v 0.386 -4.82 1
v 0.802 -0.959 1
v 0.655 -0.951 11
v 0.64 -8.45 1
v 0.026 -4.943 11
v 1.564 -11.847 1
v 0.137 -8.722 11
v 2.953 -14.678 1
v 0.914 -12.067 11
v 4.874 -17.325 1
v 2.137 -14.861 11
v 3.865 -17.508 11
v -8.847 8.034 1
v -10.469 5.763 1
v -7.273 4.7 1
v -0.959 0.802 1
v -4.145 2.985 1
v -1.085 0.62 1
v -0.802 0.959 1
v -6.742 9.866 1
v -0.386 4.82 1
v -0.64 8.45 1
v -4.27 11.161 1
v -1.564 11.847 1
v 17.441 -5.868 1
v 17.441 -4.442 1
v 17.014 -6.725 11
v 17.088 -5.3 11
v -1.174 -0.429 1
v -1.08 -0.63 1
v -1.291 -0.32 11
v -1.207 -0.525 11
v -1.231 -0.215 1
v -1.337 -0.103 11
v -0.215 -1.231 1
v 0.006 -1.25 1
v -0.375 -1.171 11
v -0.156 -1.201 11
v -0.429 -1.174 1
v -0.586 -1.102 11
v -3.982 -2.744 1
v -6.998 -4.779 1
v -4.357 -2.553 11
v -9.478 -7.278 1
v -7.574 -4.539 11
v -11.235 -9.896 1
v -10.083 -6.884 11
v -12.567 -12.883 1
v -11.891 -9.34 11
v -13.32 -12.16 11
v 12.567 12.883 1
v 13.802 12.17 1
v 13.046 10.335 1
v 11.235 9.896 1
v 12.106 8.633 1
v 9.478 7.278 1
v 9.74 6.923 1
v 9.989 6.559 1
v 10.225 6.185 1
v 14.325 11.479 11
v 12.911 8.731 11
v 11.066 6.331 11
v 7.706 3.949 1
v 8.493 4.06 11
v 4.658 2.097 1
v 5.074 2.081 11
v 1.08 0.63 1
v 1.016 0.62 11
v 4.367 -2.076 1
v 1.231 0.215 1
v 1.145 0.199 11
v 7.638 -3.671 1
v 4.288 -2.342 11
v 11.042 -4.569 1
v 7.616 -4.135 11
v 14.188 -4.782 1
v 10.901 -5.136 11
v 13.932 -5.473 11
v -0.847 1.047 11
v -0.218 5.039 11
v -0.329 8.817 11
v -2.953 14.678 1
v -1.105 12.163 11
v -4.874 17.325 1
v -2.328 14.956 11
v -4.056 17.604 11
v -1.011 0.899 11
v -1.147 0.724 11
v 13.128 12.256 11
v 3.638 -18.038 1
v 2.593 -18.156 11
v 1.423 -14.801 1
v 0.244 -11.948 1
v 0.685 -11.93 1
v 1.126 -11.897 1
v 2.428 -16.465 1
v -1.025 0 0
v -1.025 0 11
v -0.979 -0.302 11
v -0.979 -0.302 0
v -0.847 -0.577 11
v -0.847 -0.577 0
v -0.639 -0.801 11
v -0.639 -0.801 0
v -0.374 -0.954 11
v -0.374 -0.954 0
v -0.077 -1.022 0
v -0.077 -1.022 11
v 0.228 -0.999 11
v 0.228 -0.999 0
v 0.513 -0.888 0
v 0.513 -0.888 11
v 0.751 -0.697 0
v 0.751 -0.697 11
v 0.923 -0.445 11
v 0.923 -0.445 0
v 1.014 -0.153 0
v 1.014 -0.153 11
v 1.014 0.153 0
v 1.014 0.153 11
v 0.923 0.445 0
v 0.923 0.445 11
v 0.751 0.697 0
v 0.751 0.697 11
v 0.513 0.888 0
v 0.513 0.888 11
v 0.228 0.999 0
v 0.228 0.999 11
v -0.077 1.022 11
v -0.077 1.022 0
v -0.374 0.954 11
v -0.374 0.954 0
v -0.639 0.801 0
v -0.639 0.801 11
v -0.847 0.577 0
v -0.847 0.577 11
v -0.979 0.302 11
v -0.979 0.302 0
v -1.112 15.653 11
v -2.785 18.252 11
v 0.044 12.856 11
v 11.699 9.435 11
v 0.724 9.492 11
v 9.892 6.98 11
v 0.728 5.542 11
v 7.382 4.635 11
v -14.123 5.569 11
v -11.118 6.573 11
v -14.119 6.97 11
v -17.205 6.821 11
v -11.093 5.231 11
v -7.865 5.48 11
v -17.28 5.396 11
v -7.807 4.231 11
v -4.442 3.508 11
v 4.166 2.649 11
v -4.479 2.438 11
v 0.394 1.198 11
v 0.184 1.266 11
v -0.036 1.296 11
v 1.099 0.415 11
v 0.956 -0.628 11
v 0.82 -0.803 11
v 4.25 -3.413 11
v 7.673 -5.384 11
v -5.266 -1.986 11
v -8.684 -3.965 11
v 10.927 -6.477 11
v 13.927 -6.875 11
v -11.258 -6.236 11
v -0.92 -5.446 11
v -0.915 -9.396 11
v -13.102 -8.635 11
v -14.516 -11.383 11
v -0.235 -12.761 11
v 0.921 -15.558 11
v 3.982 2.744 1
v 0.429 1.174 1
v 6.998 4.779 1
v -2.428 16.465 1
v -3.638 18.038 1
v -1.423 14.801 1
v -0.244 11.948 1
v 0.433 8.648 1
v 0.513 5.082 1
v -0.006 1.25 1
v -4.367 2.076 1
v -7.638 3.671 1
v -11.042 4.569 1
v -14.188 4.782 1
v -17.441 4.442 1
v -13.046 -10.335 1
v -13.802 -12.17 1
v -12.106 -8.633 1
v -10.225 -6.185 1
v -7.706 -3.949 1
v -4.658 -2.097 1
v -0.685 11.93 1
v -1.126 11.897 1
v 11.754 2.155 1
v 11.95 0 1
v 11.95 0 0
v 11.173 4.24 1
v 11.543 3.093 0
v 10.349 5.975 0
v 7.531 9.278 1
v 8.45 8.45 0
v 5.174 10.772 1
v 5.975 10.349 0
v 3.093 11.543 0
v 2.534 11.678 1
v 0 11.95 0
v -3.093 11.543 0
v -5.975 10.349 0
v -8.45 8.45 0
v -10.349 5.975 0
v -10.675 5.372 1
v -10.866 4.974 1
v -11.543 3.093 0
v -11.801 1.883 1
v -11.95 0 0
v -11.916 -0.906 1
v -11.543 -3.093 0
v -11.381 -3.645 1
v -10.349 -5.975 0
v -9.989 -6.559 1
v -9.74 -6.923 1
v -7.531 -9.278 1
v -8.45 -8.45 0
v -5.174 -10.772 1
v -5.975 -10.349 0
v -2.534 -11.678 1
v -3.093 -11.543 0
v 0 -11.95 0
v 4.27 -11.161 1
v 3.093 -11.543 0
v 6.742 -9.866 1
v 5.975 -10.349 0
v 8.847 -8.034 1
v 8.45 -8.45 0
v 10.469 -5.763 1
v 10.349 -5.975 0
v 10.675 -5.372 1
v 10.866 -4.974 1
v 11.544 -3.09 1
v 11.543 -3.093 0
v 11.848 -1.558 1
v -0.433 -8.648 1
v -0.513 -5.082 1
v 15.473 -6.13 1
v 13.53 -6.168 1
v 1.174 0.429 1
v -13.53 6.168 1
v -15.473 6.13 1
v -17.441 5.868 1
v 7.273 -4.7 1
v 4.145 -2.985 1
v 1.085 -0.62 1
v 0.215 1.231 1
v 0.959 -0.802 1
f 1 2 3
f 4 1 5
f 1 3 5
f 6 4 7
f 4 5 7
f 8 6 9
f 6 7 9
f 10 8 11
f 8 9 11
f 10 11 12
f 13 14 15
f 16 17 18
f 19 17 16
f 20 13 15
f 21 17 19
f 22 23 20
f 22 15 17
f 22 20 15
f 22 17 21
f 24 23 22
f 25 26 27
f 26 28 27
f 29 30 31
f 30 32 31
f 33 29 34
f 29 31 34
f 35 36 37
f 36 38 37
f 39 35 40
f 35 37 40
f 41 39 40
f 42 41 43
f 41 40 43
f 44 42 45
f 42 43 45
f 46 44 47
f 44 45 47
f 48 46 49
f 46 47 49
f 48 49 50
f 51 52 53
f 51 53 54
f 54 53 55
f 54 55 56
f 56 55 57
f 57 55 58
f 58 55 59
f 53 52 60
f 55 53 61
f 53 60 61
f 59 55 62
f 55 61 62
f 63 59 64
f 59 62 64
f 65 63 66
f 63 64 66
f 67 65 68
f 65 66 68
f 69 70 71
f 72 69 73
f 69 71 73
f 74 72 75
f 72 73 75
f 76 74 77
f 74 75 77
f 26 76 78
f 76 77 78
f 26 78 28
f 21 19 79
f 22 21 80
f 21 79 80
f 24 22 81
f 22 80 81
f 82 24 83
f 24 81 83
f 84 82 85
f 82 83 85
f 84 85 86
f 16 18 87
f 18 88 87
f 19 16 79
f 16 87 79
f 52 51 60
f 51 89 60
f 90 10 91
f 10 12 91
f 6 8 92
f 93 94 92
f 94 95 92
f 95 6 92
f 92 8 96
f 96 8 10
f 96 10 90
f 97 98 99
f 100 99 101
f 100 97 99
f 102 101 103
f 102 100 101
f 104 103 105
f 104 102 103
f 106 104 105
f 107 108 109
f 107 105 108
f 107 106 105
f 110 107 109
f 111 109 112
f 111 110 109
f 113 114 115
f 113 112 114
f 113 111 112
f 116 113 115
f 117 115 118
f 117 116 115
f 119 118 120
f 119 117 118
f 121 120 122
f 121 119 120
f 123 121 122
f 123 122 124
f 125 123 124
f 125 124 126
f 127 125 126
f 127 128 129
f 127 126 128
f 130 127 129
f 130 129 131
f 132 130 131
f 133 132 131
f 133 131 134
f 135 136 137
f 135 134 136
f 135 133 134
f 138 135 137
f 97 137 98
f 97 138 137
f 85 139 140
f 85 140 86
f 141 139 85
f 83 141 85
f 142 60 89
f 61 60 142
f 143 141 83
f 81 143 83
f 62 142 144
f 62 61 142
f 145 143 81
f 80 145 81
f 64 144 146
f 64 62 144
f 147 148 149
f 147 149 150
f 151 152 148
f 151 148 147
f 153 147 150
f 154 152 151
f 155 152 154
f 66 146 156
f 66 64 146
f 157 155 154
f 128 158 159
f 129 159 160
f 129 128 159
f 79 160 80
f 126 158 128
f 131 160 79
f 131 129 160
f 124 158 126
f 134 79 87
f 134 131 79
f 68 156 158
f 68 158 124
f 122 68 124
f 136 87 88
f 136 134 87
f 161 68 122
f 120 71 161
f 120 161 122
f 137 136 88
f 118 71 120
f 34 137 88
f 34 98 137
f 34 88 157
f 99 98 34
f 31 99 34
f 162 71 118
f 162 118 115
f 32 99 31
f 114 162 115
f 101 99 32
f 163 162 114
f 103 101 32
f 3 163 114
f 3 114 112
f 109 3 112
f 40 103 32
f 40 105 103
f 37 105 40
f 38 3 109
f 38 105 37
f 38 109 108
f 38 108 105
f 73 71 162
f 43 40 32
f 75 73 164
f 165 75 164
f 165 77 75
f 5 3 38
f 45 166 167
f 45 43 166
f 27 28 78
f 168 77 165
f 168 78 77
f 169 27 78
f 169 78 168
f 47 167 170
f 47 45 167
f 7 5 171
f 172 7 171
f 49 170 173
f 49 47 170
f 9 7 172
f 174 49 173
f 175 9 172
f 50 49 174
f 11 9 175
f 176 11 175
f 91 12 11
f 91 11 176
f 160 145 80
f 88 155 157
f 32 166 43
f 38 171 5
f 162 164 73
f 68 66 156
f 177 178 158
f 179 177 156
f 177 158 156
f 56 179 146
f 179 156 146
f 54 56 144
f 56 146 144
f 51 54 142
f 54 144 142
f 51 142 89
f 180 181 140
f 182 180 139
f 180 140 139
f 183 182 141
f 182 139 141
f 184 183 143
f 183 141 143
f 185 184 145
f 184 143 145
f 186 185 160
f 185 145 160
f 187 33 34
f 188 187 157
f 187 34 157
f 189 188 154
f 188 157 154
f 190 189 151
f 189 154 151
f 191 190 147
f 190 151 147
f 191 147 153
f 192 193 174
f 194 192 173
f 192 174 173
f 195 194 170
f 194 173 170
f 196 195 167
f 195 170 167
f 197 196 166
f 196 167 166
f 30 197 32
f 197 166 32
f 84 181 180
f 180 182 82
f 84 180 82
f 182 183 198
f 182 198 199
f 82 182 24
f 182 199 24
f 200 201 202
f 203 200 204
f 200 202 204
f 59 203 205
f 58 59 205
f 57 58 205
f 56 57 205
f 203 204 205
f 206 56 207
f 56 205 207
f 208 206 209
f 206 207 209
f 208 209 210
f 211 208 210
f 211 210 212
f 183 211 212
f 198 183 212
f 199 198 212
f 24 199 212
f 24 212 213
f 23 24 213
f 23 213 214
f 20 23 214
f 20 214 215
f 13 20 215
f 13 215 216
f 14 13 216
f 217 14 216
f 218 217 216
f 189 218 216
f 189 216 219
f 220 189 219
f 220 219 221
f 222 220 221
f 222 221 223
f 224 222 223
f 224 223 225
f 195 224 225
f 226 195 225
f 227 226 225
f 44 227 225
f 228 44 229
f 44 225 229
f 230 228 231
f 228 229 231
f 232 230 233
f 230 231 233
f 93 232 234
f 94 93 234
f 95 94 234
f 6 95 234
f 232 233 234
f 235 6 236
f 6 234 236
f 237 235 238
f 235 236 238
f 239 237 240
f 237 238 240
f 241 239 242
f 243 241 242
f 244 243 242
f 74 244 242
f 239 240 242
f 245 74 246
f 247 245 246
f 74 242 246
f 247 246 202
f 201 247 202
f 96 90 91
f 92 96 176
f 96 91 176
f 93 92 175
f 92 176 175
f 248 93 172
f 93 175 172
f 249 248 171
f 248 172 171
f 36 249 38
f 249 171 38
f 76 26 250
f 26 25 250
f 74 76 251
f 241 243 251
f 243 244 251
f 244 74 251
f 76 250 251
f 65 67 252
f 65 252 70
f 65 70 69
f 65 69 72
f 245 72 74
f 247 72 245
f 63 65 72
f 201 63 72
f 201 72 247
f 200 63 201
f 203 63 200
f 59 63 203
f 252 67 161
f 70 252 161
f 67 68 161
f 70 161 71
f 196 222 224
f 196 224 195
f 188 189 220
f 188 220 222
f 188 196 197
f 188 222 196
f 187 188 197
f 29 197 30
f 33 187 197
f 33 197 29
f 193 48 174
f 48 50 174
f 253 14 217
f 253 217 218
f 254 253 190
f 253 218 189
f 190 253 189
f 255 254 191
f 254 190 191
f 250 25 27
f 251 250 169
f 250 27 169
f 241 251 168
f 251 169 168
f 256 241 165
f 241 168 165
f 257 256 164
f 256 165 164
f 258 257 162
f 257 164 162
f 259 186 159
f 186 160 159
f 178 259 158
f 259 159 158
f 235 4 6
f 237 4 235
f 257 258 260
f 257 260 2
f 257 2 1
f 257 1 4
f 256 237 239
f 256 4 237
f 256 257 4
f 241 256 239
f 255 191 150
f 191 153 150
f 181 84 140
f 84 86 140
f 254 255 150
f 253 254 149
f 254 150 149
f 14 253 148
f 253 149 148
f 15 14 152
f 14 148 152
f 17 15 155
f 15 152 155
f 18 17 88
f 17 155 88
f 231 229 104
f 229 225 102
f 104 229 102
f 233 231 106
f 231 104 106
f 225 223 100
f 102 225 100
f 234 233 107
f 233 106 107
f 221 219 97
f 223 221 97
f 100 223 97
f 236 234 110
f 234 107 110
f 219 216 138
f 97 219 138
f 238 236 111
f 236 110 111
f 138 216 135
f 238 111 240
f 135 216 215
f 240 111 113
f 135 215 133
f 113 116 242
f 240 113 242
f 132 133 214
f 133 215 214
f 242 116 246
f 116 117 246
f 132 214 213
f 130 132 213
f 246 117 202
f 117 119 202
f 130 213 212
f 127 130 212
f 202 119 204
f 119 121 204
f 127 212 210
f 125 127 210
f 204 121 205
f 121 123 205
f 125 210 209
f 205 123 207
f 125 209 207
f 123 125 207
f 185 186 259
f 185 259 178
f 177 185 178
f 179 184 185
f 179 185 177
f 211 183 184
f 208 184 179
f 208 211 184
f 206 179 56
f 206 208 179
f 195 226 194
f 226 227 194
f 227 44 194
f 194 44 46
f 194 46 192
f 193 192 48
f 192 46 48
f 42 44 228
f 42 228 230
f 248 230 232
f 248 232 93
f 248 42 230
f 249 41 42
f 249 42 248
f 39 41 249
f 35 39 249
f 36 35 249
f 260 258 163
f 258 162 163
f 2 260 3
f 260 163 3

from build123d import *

# Parameters (mm, degrees)
SKETCH1_R           = 11.95
SKETCH1_R_2         = 1.25
BOSS_EXTRUDE5_DEPTH = 1
SKETCH1_9_R         = 1.25
BOSS_EXTRUDE9_DEPTH = 1
SKETCH1_12_R        = 1.025
CUT_EXTRUDE6_DEPTH  = 28.53713591


with BuildPart() as part:
    # Sketch1 → Boss-Extrude5 (new body)
    with BuildSketch(Plane.XY):
        Circle(SKETCH1_R)
        Circle(SKETCH1_R_2, mode=Mode.SUBTRACT)
    extrude(amount=BOSS_EXTRUDE5_DEPTH)

    # Sketch1<9> → Boss-Extrude9 (add)
    with BuildSketch(Plane.XY):
        Circle(SKETCH1_9_R)
    extrude(amount=BOSS_EXTRUDE9_DEPTH)

    # Sketch16 for Loft3 → Loft3 section 0
    with BuildSketch(Plane.XY.offset(1)):
        with BuildLine():
            Line((12.566853953, 12.883098649), (13.802379149, 12.169767844))
            add(Edge.make_bspline(
                [(1.079738119, 0.629813936), (10.901614273, 3.888080069), (13.802379149, 12.169767844)],
                knots=[0, 0, 0, 1, 1, 1], degree=2))
            # circular arc as an exact rational Bezier (weights 1, cos(half-angle), 1)
            Bezier((1.079738119, 0.629813936), (1.192655997, 0.436230196), (1.231288084, 0.215475415), weights=[1, 0.984305335, 1])
            add(Edge.make_bspline(
                [(1.231288084, 0.215475415), (8.568925474, -6.096520826), (17.440517686, -4.441665445)],
                knots=[0, 0, 0, 1, 1, 1], degree=2))
            Line((17.440517686, -4.441665445), (17.440517686, -5.868327054))
            add(Edge.make_bspline(
                [(1.085303928, -0.620173673), (8.817983248, -7.497034868), (17.440517686, -5.868327054)],
                knots=[0, 0, 0, 1, 1, 1], degree=2))
            Bezier((1.085303928, -0.620173673), (0.97411443, -0.814755294), (0.802251225, -0.958589053), weights=[1, 0.984305335, 1])
            add(Edge.make_bspline(
                [(0.802251225, -0.958589053), (-0.995279173, -10.469167557), (4.873663733, -17.324764093)],
                knots=[0, 0, 0, 1, 1, 1], degree=2))
            Line((4.873663733, -17.324764093), (3.638138537, -18.038094898))
            add(Edge.make_bspline(
                [(0.005565808, -1.249987609), (-2.083631025, -11.385114937), (3.638138537, -18.038094898)],
                knots=[0, 0, 0, 1, 1, 1], degree=2))
            Bezier((0.005565808, -1.249987609), (-0.218541567, -1.250985489), (-0.429036859, -1.174064467), weights=[1, 0.984305335, 1])
            add(Edge.make_bspline(
                [(-0.429036859, -1.174064467), (-9.564204647, -4.37264673), (-12.566853953, -12.883098649)],
                knots=[0, 0, 0, 1, 1, 1], degree=2))
            Line((-12.566853953, -12.883098649), (-13.802379149, -12.169767844))
            add(Edge.make_bspline(
                [(-1.079738119, -0.629813936), (-10.901614273, -3.888080069), (-13.802379149, -12.169767844)],
                knots=[0, 0, 0, 1, 1, 1], degree=2))
            Bezier((-1.079738119, -0.629813936), (-1.192655997, -0.436230196), (-1.231288084, -0.215475415), weights=[1, 0.984305335, 1])
            add(Edge.make_bspline(
                [(-1.231288084, -0.215475415), (-8.568925474, 6.096520826), (-17.440517686, 4.441665445)],
                knots=[0, 0, 0, 1, 1, 1], degree=2))
            Line((-17.440517686, 4.441665445), (-17.440517686, 5.868327054))
            add(Edge.make_bspline(
                [(-1.085303928, 0.620173673), (-8.817983248, 7.497034868), (-17.440517686, 5.868327054)],
                knots=[0, 0, 0, 1, 1, 1], degree=2))
            Bezier((-1.085303928, 0.620173673), (-0.97411443, 0.814755294), (-0.802251225, 0.958589053), weights=[1, 0.984305335, 1])
            add(Edge.make_bspline(
                [(-0.802251225, 0.958589053), (0.995279173, 10.469167557), (-4.873663733, 17.324764093)],
                knots=[0, 0, 0, 1, 1, 1], degree=2))
            Line((-4.873663733, 17.324764093), (-3.638138537, 18.038094898))
            add(Edge.make_bspline(
                [(-0.005565808, 1.249987609), (2.083631025, 11.385114937), (-3.638138537, 18.038094898)],
                knots=[0, 0, 0, 1, 1, 1], degree=2))
            Bezier((-0.005565808, 1.249987609), (0.218541567, 1.250985489), (0.429036859, 1.174064467), weights=[1, 0.984305335, 1])
            add(Edge.make_bspline(
                [(0.429036859, 1.174064467), (9.564204647, 4.37264673), (12.566853953, 12.883098649)],
                knots=[0, 0, 0, 1, 1, 1], degree=2))
        make_face()
    # Sketch22 for Loft3 → Loft3 section 1
    with BuildSketch(Plane.XY.offset(11)):
        with BuildLine():
            Line((13.128169943, 12.255599921), (14.324669046, 11.478584319))
            add(Edge.make_bspline(
                [(1.01550943, 0.620297101), (10.994449518, 3.360060613), (14.324669046, 11.478584319)],
                knots=[0, 0, 0, 1, 1, 1], degree=2))
            Bezier((1.01550943, 0.620297101), (1.118141168, 0.421068995), (1.145166898, 0.198594904), weights=[1, 0.984305335, 1])
            add(Edge.make_bspline(
                [(1.145166898, 0.198594904), (8.142403952, -6.488773235), (17.088446394, -5.300489037)],
                knots=[0, 0, 0, 1, 1, 1], degree=2))
            Line((17.088446394, -5.300489037), (17.013780694, -6.725195456))
            add(Edge.make_bspline(
                [(0.955648314, -0.628268735), (8.31782316, -7.900402598), (17.013780694, -6.725195456)],
                knots=[0, 0, 0, 1, 1, 1], degree=2))
            Bezier((0.955648314, -0.628268735), (0.834427583, -0.81676448), (0.655272233, -0.951406495), weights=[1, 0.984305335, 1])
            add(Edge.make_bspline(
                [(0.655272233, -0.951406495), (-1.637539933, -10.354875609), (3.86456559, -17.508233528)],
                knots=[0, 0, 0, 1, 1, 1], degree=2))
            Line((3.86456559, -17.508233528), (2.593400789, -18.155924345))
            add(Edge.make_bspline(
                [(-0.155571976, -1.200710406), (-2.772337218, -11.21260778), (2.593400789, -18.155924345)],
                knots=[0, 0, 0, 1, 1, 1], degree=2))
            Bezier((-0.155571976, -1.200710406), (-0.379424445, -1.189978045), (-0.585605526, -1.102145969), weights=[1, 0.984305335, 1])
            add(Edge.make_bspline(
                [(-0.585605526, -1.102145969), (-9.875654745, -3.818246944), (-13.319591664, -12.159889061)],
                knots=[0, 0, 0, 1, 1, 1], degree=2))
            Line((-13.319591664, -12.159889061), (-14.516090766, -11.382873459))
            add(Edge.make_bspline(
                [(-1.20693115, -0.524586241), (-11.185871238, -3.264349753), (-14.516090766, -11.382873459)],
                knots=[0, 0, 0, 1, 1, 1], degree=2))
            Bezier((-1.20693115, -0.524586241), (-1.309562888, -0.325358135), (-1.336588618, -0.102884044), weights=[1, 0.984305335, 1])
            add(Edge.make_bspline(
                [(-1.336588618, -0.102884044), (-8.333825672, 6.584484095), (-17.279868114, 5.396199897)],
                knots=[0, 0, 0, 1, 1, 1], degree=2))
            Line((-17.279868114, 5.396199897), (-17.205202415, 6.820906316))
            add(Edge.make_bspline(
                [(-1.147070034, 0.723979595), (-8.50924488, 7.996113458), (-17.205202415, 6.820906316)],
                knots=[0, 0, 0, 1, 1, 1], degree=2))
            Bezier((-1.147070034, 0.723979595), (-1.025849303, 0.91247534), (-0.846693953, 1.047117355), weights=[1, 0.984305335, 1])
            add(Edge.make_bspline(
                [(-0.846693953, 1.047117355), (1.446118213, 10.450586469), (-4.055987311, 17.603944388)],
                knots=[0, 0, 0, 1, 1, 1], degree=2))
            Line((-4.055987311, 17.603944388), (-2.784822509, 18.251635205))
            add(Edge.make_bspline(
                [(-0.035849744, 1.296421266), (2.580915498, 11.30831864), (-2.784822509, 18.251635205)],
                knots=[0, 0, 0, 1, 1, 1], degree=2))
            Bezier((-0.035849744, 1.296421266), (0.188002725, 1.285688905), (0.394183805, 1.197856829), weights=[1, 0.984305335, 1])
            add(Edge.make_bspline(
                [(0.394183805, 1.197856829), (9.684233025, 3.913957804), (13.128169943, 12.255599921)],
                knots=[0, 0, 0, 1, 1, 1], degree=2))
        make_face()
    loft()

    # Sketch1<12> → Cut-Extrude6 (cut, through all)
    with BuildSketch(Plane.XY):
        Circle(SKETCH1_12_R)
    extrude(amount=CUT_EXTRUDE6_DEPTH, mode=Mode.SUBTRACT)


solid = part.part
